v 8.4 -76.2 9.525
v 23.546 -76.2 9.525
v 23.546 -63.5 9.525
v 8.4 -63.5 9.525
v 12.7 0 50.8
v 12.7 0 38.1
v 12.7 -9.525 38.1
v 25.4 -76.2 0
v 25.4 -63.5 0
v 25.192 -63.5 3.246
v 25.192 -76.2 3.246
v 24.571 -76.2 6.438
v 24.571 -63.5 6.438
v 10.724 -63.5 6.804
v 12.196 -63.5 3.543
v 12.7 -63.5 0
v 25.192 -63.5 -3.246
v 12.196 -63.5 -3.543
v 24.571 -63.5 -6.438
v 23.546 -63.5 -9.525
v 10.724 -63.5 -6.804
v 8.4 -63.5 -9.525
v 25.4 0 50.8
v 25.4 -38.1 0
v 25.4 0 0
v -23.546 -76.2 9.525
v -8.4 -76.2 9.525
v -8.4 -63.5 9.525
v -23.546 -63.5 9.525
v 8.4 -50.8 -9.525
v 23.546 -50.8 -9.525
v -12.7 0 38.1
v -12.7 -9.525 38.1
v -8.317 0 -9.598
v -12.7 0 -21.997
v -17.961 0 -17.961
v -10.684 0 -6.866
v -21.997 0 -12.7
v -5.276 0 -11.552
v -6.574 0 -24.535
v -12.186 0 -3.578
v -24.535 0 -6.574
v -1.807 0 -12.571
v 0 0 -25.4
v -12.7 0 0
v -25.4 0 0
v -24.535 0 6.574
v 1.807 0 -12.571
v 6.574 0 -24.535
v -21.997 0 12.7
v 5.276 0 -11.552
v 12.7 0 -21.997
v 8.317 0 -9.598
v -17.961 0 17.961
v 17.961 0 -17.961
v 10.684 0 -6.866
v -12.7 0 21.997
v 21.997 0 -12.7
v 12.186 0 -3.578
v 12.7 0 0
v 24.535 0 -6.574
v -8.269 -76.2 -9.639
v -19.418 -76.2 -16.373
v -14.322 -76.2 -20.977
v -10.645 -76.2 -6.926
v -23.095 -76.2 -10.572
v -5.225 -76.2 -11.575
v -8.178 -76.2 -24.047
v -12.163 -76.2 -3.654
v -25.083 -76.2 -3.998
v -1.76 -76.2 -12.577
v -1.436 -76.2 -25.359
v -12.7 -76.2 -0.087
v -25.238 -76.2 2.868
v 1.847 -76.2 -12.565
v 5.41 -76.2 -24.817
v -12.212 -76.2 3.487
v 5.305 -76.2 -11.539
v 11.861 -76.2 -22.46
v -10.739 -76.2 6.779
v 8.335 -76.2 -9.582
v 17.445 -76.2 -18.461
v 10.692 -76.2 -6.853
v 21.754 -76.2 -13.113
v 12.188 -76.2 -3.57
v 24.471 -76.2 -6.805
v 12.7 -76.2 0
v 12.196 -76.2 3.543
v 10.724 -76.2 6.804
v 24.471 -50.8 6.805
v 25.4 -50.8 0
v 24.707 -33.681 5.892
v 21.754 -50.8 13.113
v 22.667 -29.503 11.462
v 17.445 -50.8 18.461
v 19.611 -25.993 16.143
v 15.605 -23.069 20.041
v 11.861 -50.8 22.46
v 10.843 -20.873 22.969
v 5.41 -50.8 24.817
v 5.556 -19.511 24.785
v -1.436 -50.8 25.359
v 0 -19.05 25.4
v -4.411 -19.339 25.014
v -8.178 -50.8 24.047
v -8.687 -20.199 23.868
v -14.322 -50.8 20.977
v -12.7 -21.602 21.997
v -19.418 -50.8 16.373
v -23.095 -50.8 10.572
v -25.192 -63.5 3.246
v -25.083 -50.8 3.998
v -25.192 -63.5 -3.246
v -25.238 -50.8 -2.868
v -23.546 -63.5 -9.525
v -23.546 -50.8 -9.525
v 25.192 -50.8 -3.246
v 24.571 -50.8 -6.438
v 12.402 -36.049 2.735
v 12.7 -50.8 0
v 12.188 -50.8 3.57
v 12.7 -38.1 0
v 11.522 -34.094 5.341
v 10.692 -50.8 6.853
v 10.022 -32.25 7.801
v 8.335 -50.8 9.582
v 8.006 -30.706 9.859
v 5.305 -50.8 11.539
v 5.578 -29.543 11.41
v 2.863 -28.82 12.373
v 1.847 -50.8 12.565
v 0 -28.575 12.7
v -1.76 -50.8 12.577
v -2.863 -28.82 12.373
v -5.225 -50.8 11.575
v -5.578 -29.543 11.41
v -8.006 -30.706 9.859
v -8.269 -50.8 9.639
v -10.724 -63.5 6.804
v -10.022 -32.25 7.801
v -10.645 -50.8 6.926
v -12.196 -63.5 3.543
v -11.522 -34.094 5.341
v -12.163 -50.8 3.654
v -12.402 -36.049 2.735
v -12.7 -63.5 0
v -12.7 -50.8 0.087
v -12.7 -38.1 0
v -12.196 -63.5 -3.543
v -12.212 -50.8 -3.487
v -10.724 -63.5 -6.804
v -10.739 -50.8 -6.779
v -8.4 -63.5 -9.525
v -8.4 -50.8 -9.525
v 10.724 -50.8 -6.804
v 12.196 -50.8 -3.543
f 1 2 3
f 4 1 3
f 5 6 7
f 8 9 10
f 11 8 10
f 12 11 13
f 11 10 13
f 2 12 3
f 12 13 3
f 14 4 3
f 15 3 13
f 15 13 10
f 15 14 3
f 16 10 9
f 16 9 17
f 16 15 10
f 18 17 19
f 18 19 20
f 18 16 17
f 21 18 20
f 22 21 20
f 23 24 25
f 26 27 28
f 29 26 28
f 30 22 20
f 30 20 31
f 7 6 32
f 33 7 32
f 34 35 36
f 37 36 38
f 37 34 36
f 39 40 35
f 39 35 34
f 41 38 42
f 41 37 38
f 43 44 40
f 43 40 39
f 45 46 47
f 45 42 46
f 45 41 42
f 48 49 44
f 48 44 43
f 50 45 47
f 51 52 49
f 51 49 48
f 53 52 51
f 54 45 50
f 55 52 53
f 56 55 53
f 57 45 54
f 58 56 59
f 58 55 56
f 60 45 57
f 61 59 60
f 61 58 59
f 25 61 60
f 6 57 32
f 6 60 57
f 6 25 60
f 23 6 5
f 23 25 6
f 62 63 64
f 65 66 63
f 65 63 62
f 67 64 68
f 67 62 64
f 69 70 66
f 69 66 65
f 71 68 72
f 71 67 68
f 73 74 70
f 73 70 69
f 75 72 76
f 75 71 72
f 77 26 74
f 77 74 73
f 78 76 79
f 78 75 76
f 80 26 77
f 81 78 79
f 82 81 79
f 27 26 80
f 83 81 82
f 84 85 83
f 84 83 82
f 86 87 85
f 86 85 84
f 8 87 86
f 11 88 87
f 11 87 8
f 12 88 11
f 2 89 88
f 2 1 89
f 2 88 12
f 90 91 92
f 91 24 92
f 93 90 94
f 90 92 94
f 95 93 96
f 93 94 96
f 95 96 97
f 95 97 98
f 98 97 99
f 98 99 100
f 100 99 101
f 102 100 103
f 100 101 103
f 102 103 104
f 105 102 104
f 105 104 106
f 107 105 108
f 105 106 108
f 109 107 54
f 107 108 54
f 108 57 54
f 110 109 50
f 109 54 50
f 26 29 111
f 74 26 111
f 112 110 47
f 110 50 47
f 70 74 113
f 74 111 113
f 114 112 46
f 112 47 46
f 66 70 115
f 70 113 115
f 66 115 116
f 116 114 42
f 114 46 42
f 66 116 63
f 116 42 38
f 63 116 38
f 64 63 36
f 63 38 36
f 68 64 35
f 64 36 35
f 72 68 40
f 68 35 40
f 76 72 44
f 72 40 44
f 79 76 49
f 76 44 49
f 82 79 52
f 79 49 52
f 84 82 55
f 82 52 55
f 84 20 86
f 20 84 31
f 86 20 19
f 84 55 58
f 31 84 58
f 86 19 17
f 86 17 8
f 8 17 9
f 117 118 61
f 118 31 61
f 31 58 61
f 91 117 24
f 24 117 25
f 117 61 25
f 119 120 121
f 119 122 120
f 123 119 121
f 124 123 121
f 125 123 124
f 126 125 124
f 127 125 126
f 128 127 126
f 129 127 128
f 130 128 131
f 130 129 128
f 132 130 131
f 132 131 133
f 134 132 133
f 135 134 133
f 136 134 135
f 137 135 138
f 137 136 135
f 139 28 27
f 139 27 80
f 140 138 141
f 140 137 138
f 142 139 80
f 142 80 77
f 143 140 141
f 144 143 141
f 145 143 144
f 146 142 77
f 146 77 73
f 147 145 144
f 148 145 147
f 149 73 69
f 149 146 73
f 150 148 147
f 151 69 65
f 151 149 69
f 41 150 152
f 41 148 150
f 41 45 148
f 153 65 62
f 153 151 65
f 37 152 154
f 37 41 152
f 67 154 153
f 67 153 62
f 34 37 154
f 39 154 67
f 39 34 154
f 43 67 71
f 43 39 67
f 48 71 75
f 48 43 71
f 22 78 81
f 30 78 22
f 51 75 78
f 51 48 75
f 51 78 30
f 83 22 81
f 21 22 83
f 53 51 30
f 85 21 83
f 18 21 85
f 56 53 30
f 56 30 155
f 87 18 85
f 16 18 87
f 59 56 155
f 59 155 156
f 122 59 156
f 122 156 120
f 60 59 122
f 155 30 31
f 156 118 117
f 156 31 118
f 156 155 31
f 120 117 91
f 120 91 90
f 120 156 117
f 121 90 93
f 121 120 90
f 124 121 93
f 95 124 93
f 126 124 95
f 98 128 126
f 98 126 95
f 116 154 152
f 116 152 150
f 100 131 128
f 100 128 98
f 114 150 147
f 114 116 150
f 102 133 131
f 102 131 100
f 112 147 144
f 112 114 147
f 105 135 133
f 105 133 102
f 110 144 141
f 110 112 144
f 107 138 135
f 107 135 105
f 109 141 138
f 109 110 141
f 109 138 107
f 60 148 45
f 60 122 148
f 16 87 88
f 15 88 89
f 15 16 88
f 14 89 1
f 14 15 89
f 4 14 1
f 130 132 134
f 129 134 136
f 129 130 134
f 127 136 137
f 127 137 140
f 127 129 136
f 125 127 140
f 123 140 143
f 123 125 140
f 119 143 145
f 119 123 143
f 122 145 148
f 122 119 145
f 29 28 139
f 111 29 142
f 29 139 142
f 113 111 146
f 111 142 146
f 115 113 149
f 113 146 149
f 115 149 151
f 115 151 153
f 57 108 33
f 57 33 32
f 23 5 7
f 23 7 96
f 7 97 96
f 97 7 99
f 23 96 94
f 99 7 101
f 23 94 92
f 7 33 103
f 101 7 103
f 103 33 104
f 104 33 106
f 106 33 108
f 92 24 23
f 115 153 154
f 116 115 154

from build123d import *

# Parameters (mm, degrees)
F0_R      = 25.4
F0_R_2    = 12.7
F1_DEPTH  = 76.2
F2_W      = 12.7
F2_H      = 9.525
F2_H_2    = 15.875
F3_DEPTH  = 558.8
F4_W      = 12.7
F4_H      = 9.525
F4_H_2    = 15.875
F5_DEPTH  = 279.4
F7_DEPTH  = 25.4
F9_DEPTH  = 12.7
F10_W     = 25.4
F10_H     = 12.7
F11_DEPTH = 25.4


with BuildPart() as f1:
    # F0 (on Front) → F1 (new body)
    with BuildSketch(Plane.XZ):
        Circle(F0_R)
        Circle(F0_R_2, mode=Mode.SUBTRACT)
    extrude(amount=F1_DEPTH)

    # F2 (on Right) → F3 (cut)
    with BuildSketch(Plane.YZ):
        with Locations((-57.15, -4.7625)):
            Rectangle(F2_W, F2_H)
        Polygon((-63.5, 0), (-50.8, 0), (-50.8, 25.4), (-63.5, 25.4), (-63.5, 9.525), align=None)
        with Locations((-69.85, 17.4625)):
            Rectangle(F2_W, F2_H_2)
    extrude(amount=F3_DEPTH, mode=Mode.SUBTRACT)

    # F4 (on Right) → F5 (cut)
    with BuildSketch(Plane.YZ):
        with Locations((-57.15, -4.7625)):
            Rectangle(F4_W, F4_H)
        Polygon((-63.5, 0), (-50.8, 0), (-50.8, 25.4), (-63.5, 25.4), (-63.5, 9.525), align=None)
        with Locations((-69.85, 17.4625)):
            Rectangle(F4_W, F4_H_2)
    extrude(amount=-F5_DEPTH, mode=Mode.SUBTRACT)

    # F6 (on Right) → F7 (join)
    with BuildSketch(Plane.YZ):
        Polygon((-38.1, 0), (0, 0), (0, 50.8), align=None)
    extrude(amount=F7_DEPTH)

    # F8 (on Right) → F9 (join)
    with BuildSketch(Plane.YZ):
        Polygon((-38.1, 0), (0, 0), (0, 50.8), align=None)
    extrude(amount=-F9_DEPTH)

    # F10 (on face) → F11 (cut)
    with BuildSketch(Plane(origin=(0, 0, 0), x_dir=(-1, 0, 0), z_dir=(0, 1, 0))):
        with Locations((0, 44.45)):
            Rectangle(F10_W, F10_H)
    extrude(amount=-F11_DEPTH, mode=Mode.SUBTRACT)


solid = f1.part
